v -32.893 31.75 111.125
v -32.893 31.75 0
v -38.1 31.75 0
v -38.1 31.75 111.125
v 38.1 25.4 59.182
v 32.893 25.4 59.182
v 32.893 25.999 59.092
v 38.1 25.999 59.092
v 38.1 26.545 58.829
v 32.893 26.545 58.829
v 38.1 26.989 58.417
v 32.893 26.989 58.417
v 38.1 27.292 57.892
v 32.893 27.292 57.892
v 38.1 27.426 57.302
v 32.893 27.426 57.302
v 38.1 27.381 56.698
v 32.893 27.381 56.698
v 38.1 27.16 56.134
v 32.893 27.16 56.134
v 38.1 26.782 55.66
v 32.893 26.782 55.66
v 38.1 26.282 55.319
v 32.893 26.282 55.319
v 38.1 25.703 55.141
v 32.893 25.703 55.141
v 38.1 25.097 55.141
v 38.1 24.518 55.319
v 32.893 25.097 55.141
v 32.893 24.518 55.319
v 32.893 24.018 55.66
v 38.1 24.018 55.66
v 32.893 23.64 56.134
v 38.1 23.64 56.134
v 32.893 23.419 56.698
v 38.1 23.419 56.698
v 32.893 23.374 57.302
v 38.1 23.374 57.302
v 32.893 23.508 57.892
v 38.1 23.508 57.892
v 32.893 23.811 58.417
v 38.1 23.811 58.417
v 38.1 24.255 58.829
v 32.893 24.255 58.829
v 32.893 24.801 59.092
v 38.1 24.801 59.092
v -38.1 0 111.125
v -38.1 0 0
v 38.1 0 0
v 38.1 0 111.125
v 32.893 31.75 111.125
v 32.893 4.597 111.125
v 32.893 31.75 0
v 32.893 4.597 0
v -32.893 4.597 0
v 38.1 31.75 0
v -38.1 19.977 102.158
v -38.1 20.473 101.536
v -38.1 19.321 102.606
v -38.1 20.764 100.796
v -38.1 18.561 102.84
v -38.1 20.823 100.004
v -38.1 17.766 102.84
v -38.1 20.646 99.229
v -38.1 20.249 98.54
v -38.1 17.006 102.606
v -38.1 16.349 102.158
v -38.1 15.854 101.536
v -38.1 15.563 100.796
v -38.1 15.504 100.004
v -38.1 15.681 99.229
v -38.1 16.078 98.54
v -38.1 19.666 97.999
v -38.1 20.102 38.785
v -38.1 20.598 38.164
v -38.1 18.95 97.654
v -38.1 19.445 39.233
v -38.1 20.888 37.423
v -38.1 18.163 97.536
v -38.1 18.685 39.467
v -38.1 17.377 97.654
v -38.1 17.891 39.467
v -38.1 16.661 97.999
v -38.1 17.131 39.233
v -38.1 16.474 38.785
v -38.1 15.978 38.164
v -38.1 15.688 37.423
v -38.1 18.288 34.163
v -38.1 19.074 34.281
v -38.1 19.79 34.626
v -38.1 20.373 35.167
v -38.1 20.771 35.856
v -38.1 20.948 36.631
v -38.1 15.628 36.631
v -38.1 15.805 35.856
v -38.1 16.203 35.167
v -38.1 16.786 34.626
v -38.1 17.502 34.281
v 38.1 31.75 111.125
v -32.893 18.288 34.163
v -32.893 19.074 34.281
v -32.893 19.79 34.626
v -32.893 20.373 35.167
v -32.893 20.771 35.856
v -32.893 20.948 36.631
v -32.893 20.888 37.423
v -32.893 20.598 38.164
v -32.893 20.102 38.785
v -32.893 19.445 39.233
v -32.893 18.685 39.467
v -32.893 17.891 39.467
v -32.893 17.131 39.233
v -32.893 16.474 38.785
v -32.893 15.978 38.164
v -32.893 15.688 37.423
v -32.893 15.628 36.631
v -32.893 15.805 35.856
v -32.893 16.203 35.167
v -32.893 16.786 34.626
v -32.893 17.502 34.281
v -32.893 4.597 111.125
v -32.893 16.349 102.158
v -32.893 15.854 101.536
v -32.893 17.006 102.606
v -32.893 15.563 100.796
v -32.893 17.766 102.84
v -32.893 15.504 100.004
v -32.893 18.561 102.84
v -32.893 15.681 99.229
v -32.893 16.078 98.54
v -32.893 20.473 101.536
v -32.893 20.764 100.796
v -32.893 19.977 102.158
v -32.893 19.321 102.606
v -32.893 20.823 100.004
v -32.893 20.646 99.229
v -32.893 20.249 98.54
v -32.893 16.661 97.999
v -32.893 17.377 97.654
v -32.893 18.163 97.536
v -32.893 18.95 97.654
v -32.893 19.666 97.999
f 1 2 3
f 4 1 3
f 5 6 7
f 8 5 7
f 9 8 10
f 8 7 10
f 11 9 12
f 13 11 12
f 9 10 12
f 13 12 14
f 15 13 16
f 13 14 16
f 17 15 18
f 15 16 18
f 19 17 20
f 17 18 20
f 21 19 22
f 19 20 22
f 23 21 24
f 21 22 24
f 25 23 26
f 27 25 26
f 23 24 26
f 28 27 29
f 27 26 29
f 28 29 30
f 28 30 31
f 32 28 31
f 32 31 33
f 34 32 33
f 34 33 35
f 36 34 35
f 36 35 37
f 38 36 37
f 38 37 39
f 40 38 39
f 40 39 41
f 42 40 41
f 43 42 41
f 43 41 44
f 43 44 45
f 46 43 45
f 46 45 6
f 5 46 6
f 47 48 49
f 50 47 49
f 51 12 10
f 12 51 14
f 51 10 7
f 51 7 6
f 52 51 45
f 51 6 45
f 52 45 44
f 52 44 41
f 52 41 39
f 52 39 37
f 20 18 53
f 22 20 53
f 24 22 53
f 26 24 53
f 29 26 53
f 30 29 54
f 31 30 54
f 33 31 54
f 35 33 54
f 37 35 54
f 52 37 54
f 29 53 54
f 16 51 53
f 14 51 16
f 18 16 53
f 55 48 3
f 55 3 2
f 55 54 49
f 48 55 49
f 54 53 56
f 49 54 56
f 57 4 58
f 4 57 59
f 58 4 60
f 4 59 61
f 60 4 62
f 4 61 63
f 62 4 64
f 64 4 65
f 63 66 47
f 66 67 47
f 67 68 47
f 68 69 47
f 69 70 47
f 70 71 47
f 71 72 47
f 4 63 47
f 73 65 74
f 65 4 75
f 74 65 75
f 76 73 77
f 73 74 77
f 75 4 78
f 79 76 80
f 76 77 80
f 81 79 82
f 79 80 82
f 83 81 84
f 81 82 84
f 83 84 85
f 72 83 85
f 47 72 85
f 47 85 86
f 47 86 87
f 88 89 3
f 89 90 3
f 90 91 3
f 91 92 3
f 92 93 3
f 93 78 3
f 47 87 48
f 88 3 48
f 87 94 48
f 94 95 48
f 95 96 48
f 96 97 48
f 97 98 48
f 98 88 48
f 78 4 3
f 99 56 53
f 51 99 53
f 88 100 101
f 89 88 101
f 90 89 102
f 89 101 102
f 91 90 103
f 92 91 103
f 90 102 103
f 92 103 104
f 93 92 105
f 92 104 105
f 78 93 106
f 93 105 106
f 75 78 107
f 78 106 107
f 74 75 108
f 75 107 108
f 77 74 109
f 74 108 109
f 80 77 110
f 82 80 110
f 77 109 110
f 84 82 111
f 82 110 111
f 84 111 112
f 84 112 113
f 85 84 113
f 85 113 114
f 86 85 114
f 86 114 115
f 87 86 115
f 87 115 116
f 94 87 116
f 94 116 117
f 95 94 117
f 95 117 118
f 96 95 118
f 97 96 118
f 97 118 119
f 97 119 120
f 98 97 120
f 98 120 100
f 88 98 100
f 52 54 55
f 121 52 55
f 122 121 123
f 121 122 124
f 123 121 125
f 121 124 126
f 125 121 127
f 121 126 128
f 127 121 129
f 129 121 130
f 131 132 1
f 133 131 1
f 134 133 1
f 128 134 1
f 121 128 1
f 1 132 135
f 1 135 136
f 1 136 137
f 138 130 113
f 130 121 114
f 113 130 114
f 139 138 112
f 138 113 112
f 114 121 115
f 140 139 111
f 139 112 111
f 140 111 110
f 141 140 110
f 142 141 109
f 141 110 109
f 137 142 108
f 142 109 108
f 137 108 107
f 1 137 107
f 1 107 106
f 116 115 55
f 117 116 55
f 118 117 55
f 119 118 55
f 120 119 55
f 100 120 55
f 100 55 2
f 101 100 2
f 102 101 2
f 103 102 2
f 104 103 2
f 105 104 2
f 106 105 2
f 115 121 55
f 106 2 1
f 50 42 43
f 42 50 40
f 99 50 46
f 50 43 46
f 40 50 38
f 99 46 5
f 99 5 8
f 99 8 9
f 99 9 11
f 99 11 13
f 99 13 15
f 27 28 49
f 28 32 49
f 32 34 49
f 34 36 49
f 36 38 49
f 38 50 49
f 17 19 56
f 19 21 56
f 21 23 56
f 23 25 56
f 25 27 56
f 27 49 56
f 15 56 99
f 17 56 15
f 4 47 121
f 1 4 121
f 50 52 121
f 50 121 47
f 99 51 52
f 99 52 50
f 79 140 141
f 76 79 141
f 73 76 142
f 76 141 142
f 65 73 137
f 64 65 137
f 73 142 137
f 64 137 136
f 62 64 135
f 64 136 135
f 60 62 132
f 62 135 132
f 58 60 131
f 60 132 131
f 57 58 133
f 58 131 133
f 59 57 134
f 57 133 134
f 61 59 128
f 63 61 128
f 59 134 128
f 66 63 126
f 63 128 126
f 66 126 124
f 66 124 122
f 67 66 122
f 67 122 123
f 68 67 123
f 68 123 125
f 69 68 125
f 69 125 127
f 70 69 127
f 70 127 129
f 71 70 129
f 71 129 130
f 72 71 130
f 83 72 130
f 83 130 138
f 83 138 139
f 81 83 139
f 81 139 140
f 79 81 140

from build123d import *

# Parameters (mm, degrees)
BOSS_EXTRUDE3_DEPTH = 111.125
SKETCH4_R           = 2.667
CUT_EXTRUDE1_DEPTH  = 136.634929771
SKETCH5_R           = 2.667
CUT_EXTRUDE2_DEPTH  = 136.634929771
SKETCH6_R           = 2.032
CUT_EXTRUDE3_DEPTH  = 136.634929771


with BuildPart() as part:
    # Sketch2 → Boss-Extrude3 (new body)
    with BuildSketch(Plane.XY):
        Polygon((-38.1, 0), (38.1, 0), (38.1, 31.75), (32.893, 31.75), (32.893, 4.5974), (-32.893, 4.5974), (-32.893, 31.75), (-38.1, 31.75), align=None)
    extrude(amount=BOSS_EXTRUDE3_DEPTH)

    # Sketch4 → Cut-Extrude1 (cut, through all)
    with BuildSketch(Plane(origin=(-32.893, 0, 0), x_dir=(0, 0, -1), z_dir=(1, 0, 0))):
        with Locations((-36.83, 18.288)):
            Circle(SKETCH4_R)
    extrude(amount=-CUT_EXTRUDE1_DEPTH, mode=Mode.SUBTRACT)

    # Sketch5 → Cut-Extrude2 (cut, through all)
    with BuildSketch(Plane(origin=(-32.893, 0, 0), x_dir=(0, 0, -1), z_dir=(1, 0, 0))):
        with Locations((-100.203, 18.163390835)):
            Circle(SKETCH5_R)
    extrude(amount=-CUT_EXTRUDE2_DEPTH, mode=Mode.SUBTRACT)

    # Sketch6 → Cut-Extrude3 (cut, through all)
    with BuildSketch(Plane.ZY.offset(-32.893)):
        with Locations((57.15, 25.4)):
            Circle(SKETCH6_R)
    extrude(amount=-CUT_EXTRUDE3_DEPTH, mode=Mode.SUBTRACT)


solid = part.part
